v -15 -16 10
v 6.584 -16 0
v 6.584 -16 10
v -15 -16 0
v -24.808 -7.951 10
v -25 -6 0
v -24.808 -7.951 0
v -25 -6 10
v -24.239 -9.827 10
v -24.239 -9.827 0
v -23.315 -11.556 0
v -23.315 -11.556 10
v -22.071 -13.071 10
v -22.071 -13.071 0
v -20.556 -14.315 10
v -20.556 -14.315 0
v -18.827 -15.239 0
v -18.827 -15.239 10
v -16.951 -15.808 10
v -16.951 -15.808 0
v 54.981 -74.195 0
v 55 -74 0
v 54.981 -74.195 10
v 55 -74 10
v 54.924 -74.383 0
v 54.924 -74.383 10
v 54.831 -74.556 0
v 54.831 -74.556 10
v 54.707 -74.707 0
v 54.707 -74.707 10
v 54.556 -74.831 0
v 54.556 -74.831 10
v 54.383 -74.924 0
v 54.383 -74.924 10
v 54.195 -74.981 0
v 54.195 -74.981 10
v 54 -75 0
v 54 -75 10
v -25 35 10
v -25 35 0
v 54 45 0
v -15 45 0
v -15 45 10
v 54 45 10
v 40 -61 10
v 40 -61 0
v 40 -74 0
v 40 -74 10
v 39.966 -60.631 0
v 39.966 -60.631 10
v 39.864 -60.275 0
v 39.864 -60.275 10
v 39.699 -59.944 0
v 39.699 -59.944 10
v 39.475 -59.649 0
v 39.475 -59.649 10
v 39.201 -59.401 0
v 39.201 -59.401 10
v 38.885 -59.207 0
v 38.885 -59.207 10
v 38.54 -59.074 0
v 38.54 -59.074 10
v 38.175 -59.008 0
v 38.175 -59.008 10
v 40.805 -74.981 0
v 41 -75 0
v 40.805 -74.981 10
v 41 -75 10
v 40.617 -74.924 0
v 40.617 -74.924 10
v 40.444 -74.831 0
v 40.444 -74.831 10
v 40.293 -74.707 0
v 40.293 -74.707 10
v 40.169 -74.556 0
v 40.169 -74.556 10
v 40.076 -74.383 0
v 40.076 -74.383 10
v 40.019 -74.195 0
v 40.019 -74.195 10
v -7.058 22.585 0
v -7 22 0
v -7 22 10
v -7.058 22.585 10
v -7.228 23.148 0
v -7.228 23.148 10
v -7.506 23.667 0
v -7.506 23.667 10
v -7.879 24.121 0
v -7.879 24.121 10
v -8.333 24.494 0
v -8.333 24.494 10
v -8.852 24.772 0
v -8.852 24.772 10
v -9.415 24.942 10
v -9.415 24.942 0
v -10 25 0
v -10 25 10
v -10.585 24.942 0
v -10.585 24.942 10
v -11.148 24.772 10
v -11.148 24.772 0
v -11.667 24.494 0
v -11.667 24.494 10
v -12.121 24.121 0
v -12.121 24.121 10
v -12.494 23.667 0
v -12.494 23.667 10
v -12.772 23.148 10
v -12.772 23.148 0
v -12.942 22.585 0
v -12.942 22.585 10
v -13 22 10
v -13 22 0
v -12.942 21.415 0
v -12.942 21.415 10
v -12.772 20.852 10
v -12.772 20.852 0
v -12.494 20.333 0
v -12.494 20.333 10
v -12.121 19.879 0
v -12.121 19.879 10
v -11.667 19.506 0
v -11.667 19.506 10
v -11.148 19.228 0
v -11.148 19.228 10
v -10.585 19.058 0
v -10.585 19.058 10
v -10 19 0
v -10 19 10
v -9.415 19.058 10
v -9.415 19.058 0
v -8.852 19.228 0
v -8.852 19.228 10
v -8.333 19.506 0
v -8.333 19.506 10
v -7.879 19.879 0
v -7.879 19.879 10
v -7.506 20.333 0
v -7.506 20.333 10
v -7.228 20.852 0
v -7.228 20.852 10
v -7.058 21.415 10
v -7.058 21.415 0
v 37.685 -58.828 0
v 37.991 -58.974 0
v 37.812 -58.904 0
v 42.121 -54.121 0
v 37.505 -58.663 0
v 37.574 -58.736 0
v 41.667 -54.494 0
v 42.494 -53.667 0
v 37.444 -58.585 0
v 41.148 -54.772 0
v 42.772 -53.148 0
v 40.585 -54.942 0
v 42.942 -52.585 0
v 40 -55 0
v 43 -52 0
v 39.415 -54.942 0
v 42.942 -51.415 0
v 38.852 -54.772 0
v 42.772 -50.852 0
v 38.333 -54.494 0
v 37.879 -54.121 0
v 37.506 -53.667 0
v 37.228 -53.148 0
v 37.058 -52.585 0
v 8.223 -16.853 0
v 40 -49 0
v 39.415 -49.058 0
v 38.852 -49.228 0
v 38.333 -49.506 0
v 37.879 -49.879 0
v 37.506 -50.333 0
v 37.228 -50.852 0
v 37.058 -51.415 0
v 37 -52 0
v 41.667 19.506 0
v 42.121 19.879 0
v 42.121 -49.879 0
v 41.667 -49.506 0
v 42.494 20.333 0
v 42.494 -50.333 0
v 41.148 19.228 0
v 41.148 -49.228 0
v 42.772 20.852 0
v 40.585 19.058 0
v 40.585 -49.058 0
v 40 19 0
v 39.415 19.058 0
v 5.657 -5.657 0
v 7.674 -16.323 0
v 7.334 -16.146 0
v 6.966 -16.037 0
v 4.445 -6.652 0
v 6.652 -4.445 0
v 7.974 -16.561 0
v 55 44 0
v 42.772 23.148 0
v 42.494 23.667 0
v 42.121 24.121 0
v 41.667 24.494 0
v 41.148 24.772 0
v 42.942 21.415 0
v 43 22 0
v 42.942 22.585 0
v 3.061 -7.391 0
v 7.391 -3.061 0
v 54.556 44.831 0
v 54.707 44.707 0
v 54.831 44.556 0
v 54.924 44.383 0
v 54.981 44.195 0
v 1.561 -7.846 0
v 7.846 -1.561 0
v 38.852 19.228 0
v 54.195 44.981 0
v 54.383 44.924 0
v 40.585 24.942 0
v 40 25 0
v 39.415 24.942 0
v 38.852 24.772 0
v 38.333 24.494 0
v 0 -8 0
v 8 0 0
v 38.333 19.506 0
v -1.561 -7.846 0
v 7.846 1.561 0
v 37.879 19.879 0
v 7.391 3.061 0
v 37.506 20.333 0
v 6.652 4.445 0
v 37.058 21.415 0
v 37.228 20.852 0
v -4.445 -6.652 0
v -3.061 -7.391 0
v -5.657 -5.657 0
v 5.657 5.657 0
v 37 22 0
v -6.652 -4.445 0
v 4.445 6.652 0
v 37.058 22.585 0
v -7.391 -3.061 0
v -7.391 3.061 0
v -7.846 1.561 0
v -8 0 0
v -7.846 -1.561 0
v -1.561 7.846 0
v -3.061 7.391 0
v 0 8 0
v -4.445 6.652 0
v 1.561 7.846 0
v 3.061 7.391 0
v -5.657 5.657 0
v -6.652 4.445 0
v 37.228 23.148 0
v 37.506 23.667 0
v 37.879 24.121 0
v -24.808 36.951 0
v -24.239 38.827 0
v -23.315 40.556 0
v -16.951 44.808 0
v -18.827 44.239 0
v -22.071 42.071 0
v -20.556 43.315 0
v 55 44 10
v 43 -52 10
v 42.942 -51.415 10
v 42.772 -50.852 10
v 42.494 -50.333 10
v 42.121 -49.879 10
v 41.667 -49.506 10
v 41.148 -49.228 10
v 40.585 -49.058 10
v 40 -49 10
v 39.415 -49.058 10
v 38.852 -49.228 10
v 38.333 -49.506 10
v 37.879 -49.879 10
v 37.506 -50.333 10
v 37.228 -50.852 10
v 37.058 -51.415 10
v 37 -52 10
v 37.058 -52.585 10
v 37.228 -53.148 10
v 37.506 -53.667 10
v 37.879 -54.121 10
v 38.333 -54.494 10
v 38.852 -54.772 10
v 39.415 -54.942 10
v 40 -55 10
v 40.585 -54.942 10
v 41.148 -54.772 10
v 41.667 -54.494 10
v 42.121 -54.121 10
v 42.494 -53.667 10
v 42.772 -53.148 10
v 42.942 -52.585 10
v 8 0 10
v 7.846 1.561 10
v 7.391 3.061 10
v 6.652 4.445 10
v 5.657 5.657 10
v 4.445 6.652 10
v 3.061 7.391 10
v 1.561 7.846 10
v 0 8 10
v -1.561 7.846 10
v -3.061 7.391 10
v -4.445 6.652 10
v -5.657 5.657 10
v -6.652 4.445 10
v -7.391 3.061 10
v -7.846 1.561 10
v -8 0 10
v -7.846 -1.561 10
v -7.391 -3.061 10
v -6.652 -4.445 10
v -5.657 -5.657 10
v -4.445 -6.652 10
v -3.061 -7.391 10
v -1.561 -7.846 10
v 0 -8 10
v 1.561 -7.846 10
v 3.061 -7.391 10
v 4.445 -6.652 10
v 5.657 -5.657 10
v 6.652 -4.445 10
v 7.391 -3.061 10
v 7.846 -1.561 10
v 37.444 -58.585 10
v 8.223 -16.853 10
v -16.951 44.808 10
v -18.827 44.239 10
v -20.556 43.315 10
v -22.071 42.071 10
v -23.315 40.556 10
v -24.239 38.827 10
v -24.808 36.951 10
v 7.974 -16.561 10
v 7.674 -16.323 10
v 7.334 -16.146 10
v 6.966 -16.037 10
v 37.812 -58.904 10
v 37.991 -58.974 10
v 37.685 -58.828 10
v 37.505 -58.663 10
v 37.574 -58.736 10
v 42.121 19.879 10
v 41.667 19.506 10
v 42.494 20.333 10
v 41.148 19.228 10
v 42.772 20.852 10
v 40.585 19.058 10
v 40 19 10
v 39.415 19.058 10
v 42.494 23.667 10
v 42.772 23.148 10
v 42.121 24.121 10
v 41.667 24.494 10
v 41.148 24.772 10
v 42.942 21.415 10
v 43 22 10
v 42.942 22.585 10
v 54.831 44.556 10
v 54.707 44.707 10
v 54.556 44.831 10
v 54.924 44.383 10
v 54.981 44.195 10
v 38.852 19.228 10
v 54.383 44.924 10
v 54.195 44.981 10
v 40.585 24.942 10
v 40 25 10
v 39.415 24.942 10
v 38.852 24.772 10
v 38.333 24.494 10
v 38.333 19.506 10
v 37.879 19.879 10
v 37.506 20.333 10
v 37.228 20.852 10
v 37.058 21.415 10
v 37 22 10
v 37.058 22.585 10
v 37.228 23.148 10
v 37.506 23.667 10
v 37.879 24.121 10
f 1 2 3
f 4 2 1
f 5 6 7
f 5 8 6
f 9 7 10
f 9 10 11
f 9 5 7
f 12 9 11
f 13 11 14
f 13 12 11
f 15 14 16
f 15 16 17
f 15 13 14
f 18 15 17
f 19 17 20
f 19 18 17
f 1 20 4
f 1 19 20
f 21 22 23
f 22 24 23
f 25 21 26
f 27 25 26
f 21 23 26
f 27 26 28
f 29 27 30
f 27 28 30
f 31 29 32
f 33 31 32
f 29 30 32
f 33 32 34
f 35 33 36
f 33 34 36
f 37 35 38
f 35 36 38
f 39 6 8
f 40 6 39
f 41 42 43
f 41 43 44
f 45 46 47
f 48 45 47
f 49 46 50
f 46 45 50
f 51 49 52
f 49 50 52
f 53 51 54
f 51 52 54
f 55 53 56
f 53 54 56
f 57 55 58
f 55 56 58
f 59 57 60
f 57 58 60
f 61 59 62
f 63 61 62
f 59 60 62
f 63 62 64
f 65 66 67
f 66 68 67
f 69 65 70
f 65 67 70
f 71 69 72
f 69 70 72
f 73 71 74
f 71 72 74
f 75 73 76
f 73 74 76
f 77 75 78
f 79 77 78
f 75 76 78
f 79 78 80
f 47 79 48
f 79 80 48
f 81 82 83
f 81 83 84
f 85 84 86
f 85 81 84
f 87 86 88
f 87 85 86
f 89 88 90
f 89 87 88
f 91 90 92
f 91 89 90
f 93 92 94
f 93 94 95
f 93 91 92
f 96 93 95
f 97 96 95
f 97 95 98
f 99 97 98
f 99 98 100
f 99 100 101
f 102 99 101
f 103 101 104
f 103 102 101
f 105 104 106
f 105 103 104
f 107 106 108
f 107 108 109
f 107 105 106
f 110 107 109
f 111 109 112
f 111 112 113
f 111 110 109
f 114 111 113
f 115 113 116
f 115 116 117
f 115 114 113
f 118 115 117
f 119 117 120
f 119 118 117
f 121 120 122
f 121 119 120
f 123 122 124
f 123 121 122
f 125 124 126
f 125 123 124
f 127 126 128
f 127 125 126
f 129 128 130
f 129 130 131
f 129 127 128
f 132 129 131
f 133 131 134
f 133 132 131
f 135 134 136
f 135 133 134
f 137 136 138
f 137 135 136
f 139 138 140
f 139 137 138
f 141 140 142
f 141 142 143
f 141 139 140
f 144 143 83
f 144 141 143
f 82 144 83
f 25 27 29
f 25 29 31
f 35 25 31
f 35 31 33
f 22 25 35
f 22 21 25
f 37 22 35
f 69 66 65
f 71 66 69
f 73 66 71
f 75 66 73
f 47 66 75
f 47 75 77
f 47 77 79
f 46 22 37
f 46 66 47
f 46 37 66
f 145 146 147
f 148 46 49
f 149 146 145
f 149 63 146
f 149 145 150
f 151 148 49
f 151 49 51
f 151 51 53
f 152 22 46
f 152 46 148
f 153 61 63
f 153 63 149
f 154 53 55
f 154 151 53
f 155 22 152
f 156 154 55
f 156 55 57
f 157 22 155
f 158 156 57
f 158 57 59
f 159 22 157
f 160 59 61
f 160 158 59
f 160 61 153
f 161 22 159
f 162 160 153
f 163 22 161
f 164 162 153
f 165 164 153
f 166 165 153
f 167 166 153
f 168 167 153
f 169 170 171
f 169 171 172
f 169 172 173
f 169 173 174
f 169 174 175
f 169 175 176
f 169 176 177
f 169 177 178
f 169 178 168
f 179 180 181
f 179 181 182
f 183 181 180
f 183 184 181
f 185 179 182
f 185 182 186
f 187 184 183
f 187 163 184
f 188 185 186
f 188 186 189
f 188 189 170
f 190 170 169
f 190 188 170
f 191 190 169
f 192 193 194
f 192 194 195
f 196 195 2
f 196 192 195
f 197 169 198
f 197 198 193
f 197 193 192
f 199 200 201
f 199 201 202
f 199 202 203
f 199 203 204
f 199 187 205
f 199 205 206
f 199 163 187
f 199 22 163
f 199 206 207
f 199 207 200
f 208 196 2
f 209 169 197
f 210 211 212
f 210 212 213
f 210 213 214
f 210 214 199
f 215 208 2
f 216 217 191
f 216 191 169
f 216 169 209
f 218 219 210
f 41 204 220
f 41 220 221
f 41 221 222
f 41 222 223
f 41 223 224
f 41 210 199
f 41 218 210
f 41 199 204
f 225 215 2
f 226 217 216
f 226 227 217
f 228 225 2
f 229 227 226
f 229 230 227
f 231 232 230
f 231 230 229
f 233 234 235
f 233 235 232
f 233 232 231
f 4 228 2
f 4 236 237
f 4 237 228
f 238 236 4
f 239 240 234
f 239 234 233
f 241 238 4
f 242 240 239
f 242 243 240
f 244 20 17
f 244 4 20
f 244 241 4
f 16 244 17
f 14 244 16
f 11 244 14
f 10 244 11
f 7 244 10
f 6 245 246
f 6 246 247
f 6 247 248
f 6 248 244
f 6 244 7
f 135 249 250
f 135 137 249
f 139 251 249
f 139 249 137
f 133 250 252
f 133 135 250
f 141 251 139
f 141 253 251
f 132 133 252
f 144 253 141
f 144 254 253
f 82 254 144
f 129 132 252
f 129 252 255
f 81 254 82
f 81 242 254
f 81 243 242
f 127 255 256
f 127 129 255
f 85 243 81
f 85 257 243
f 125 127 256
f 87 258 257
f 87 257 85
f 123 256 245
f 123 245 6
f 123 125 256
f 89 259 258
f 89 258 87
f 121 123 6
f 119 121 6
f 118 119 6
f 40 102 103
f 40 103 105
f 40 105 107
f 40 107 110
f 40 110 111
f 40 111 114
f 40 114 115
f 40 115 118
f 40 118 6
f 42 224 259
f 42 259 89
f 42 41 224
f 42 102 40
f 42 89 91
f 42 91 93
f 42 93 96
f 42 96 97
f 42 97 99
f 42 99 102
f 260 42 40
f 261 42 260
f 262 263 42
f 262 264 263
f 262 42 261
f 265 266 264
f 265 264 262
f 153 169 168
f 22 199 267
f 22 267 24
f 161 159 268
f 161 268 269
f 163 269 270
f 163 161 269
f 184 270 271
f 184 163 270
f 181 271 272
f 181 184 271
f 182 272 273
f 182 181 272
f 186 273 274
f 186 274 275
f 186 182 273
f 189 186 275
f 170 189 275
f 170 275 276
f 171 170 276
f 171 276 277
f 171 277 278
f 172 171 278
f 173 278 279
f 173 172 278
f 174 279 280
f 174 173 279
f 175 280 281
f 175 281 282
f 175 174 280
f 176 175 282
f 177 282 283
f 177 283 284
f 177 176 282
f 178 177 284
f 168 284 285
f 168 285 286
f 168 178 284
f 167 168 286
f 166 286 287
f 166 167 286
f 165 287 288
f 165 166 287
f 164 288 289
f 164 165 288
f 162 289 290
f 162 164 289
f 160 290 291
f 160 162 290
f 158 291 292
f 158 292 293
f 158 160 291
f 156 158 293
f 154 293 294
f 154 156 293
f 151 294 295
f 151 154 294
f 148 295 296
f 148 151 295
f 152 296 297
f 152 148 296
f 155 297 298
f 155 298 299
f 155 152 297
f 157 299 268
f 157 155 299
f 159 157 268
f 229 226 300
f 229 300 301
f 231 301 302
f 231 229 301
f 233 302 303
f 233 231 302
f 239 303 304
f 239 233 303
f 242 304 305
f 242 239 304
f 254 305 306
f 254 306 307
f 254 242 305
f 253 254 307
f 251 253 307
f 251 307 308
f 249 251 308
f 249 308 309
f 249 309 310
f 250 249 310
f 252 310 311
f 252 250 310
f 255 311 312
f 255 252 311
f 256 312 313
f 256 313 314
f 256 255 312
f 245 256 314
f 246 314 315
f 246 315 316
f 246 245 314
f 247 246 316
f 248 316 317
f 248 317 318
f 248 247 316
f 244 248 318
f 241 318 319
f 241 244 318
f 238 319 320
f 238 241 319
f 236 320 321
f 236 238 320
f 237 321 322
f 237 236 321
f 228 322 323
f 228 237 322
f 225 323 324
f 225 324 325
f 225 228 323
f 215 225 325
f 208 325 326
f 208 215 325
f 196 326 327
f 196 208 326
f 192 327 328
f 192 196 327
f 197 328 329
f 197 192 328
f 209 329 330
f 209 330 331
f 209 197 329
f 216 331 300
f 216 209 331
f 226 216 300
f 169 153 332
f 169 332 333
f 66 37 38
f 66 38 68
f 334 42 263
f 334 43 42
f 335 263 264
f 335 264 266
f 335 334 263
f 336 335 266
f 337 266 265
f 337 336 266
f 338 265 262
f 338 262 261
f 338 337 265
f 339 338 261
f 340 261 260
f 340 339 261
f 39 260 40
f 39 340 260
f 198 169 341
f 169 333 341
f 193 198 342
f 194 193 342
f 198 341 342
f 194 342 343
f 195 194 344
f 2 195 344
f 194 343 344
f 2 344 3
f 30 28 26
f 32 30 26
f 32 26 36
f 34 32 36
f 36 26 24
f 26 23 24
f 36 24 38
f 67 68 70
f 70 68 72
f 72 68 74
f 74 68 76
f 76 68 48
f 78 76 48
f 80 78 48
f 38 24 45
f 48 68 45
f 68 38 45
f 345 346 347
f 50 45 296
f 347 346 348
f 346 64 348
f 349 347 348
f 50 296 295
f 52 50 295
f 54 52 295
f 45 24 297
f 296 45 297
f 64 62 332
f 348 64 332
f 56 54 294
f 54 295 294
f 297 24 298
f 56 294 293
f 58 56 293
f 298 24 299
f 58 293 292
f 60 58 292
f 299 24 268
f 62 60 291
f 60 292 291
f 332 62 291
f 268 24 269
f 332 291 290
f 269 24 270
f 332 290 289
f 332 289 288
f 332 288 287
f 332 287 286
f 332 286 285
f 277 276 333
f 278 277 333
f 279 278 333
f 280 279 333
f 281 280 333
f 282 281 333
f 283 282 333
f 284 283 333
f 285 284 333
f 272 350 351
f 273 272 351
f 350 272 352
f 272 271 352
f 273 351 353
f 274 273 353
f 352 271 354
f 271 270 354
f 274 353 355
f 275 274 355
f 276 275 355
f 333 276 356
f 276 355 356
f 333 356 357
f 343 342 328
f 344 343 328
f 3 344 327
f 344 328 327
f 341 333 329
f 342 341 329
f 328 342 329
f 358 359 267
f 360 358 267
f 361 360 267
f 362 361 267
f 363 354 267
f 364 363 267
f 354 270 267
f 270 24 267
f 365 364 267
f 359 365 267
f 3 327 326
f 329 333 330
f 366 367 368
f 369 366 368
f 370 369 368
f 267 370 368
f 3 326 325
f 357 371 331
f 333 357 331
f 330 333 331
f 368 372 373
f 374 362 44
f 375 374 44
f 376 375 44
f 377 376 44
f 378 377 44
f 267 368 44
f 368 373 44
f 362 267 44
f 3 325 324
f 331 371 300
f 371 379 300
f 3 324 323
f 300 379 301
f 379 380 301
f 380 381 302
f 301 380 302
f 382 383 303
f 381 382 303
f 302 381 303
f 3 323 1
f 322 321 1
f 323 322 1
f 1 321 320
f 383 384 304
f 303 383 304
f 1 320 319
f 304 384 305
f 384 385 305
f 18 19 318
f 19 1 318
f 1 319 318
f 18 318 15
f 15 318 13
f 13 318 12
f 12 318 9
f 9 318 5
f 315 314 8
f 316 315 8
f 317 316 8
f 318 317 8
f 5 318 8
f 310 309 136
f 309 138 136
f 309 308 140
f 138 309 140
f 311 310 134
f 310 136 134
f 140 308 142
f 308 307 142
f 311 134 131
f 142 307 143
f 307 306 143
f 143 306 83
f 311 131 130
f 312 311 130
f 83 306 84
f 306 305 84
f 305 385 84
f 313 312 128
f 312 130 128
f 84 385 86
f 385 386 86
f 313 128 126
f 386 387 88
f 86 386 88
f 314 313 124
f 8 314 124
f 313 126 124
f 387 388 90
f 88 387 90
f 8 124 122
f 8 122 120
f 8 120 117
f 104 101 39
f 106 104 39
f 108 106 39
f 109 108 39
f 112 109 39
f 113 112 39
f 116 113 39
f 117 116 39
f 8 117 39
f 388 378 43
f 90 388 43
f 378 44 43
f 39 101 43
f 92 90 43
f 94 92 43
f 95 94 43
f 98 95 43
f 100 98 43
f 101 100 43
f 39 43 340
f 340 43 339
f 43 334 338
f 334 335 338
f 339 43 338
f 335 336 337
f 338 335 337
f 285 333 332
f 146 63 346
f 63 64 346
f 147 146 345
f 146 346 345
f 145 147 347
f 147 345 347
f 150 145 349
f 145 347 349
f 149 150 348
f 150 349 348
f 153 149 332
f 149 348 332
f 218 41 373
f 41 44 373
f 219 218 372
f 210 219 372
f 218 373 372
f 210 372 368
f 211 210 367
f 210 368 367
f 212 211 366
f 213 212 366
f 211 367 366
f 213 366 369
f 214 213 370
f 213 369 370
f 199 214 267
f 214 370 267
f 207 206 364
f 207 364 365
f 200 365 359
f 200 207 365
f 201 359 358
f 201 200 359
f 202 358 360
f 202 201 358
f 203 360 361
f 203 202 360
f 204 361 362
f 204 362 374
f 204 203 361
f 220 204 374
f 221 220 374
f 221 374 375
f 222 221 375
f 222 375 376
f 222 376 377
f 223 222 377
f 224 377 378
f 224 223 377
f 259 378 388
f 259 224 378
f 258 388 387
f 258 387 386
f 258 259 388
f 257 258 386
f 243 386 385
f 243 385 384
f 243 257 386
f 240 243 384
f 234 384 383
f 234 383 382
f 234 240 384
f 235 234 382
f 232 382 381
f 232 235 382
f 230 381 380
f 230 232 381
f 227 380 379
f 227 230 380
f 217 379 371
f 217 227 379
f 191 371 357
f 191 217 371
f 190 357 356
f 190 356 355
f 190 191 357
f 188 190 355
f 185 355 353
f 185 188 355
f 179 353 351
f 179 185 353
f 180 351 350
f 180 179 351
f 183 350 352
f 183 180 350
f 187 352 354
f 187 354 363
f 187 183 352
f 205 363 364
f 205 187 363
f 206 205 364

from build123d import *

# Parameters (mm, degrees)
SKETCH_R    = 8
SKETCH_R_2  = 3
PAD_DEPTH   = 10
FILLET_R    = 10
FILLET001_R = 1
FILLET002_R = 2
FILLET003_R = 1
FILLET004_R = 2


with BuildPart() as part:
    # Sketch → Pad (new body)
    with BuildSketch(Plane.XY):
        Polygon((-25, 45), (55, 45), (55, -75), (40, -75), (40, -62.235414), (40, -59), (37.734539, -59), (7.625614, -16), (-25, -16), align=None)
        Circle(SKETCH_R, mode=Mode.SUBTRACT)
        with Locations((40, -52)):
            Circle(SKETCH_R_2, mode=Mode.SUBTRACT)
        with Locations((40, 22)):
            Circle(SKETCH_R_2, mode=Mode.SUBTRACT)
        with Locations((-10, 22)):
            Circle(SKETCH_R_2, mode=Mode.SUBTRACT)
    extrude(amount=PAD_DEPTH)

    # Fillet
    fillet_edges = [part.edges().sort_by_distance(p)[0] for p in [
        (-25, -16, 5),
        (-25, 45, 5),
    ]]
    fillet(fillet_edges, radius=FILLET_R)

    # Fillet001
    fillet001_edges = [part.edges().sort_by_distance(p)[0] for p in [
        (55, -75, 5),
        (40, -75, 5),
        (55, 45, 5),
    ]]
    fillet(fillet001_edges, radius=FILLET001_R)

    # Fillet002
    fillet002_edges = [part.edges().sort_by_distance(p)[0] for p in [
        (40, -59, 5),
    ]]
    fillet(fillet002_edges, radius=FILLET002_R)

    # Fillet003
    fillet003_edges = [part.edges().sort_by_distance(p)[0] for p in [
        (37.734539, -59, 5),
    ]]
    fillet(fillet003_edges, radius=FILLET003_R)

    # Fillet004
    fillet004_edges = [part.edges().sort_by_distance(p)[0] for p in [
        (7.625614, -16, 5),
    ]]
    fillet(fillet004_edges, radius=FILLET004_R)


solid = part.part
